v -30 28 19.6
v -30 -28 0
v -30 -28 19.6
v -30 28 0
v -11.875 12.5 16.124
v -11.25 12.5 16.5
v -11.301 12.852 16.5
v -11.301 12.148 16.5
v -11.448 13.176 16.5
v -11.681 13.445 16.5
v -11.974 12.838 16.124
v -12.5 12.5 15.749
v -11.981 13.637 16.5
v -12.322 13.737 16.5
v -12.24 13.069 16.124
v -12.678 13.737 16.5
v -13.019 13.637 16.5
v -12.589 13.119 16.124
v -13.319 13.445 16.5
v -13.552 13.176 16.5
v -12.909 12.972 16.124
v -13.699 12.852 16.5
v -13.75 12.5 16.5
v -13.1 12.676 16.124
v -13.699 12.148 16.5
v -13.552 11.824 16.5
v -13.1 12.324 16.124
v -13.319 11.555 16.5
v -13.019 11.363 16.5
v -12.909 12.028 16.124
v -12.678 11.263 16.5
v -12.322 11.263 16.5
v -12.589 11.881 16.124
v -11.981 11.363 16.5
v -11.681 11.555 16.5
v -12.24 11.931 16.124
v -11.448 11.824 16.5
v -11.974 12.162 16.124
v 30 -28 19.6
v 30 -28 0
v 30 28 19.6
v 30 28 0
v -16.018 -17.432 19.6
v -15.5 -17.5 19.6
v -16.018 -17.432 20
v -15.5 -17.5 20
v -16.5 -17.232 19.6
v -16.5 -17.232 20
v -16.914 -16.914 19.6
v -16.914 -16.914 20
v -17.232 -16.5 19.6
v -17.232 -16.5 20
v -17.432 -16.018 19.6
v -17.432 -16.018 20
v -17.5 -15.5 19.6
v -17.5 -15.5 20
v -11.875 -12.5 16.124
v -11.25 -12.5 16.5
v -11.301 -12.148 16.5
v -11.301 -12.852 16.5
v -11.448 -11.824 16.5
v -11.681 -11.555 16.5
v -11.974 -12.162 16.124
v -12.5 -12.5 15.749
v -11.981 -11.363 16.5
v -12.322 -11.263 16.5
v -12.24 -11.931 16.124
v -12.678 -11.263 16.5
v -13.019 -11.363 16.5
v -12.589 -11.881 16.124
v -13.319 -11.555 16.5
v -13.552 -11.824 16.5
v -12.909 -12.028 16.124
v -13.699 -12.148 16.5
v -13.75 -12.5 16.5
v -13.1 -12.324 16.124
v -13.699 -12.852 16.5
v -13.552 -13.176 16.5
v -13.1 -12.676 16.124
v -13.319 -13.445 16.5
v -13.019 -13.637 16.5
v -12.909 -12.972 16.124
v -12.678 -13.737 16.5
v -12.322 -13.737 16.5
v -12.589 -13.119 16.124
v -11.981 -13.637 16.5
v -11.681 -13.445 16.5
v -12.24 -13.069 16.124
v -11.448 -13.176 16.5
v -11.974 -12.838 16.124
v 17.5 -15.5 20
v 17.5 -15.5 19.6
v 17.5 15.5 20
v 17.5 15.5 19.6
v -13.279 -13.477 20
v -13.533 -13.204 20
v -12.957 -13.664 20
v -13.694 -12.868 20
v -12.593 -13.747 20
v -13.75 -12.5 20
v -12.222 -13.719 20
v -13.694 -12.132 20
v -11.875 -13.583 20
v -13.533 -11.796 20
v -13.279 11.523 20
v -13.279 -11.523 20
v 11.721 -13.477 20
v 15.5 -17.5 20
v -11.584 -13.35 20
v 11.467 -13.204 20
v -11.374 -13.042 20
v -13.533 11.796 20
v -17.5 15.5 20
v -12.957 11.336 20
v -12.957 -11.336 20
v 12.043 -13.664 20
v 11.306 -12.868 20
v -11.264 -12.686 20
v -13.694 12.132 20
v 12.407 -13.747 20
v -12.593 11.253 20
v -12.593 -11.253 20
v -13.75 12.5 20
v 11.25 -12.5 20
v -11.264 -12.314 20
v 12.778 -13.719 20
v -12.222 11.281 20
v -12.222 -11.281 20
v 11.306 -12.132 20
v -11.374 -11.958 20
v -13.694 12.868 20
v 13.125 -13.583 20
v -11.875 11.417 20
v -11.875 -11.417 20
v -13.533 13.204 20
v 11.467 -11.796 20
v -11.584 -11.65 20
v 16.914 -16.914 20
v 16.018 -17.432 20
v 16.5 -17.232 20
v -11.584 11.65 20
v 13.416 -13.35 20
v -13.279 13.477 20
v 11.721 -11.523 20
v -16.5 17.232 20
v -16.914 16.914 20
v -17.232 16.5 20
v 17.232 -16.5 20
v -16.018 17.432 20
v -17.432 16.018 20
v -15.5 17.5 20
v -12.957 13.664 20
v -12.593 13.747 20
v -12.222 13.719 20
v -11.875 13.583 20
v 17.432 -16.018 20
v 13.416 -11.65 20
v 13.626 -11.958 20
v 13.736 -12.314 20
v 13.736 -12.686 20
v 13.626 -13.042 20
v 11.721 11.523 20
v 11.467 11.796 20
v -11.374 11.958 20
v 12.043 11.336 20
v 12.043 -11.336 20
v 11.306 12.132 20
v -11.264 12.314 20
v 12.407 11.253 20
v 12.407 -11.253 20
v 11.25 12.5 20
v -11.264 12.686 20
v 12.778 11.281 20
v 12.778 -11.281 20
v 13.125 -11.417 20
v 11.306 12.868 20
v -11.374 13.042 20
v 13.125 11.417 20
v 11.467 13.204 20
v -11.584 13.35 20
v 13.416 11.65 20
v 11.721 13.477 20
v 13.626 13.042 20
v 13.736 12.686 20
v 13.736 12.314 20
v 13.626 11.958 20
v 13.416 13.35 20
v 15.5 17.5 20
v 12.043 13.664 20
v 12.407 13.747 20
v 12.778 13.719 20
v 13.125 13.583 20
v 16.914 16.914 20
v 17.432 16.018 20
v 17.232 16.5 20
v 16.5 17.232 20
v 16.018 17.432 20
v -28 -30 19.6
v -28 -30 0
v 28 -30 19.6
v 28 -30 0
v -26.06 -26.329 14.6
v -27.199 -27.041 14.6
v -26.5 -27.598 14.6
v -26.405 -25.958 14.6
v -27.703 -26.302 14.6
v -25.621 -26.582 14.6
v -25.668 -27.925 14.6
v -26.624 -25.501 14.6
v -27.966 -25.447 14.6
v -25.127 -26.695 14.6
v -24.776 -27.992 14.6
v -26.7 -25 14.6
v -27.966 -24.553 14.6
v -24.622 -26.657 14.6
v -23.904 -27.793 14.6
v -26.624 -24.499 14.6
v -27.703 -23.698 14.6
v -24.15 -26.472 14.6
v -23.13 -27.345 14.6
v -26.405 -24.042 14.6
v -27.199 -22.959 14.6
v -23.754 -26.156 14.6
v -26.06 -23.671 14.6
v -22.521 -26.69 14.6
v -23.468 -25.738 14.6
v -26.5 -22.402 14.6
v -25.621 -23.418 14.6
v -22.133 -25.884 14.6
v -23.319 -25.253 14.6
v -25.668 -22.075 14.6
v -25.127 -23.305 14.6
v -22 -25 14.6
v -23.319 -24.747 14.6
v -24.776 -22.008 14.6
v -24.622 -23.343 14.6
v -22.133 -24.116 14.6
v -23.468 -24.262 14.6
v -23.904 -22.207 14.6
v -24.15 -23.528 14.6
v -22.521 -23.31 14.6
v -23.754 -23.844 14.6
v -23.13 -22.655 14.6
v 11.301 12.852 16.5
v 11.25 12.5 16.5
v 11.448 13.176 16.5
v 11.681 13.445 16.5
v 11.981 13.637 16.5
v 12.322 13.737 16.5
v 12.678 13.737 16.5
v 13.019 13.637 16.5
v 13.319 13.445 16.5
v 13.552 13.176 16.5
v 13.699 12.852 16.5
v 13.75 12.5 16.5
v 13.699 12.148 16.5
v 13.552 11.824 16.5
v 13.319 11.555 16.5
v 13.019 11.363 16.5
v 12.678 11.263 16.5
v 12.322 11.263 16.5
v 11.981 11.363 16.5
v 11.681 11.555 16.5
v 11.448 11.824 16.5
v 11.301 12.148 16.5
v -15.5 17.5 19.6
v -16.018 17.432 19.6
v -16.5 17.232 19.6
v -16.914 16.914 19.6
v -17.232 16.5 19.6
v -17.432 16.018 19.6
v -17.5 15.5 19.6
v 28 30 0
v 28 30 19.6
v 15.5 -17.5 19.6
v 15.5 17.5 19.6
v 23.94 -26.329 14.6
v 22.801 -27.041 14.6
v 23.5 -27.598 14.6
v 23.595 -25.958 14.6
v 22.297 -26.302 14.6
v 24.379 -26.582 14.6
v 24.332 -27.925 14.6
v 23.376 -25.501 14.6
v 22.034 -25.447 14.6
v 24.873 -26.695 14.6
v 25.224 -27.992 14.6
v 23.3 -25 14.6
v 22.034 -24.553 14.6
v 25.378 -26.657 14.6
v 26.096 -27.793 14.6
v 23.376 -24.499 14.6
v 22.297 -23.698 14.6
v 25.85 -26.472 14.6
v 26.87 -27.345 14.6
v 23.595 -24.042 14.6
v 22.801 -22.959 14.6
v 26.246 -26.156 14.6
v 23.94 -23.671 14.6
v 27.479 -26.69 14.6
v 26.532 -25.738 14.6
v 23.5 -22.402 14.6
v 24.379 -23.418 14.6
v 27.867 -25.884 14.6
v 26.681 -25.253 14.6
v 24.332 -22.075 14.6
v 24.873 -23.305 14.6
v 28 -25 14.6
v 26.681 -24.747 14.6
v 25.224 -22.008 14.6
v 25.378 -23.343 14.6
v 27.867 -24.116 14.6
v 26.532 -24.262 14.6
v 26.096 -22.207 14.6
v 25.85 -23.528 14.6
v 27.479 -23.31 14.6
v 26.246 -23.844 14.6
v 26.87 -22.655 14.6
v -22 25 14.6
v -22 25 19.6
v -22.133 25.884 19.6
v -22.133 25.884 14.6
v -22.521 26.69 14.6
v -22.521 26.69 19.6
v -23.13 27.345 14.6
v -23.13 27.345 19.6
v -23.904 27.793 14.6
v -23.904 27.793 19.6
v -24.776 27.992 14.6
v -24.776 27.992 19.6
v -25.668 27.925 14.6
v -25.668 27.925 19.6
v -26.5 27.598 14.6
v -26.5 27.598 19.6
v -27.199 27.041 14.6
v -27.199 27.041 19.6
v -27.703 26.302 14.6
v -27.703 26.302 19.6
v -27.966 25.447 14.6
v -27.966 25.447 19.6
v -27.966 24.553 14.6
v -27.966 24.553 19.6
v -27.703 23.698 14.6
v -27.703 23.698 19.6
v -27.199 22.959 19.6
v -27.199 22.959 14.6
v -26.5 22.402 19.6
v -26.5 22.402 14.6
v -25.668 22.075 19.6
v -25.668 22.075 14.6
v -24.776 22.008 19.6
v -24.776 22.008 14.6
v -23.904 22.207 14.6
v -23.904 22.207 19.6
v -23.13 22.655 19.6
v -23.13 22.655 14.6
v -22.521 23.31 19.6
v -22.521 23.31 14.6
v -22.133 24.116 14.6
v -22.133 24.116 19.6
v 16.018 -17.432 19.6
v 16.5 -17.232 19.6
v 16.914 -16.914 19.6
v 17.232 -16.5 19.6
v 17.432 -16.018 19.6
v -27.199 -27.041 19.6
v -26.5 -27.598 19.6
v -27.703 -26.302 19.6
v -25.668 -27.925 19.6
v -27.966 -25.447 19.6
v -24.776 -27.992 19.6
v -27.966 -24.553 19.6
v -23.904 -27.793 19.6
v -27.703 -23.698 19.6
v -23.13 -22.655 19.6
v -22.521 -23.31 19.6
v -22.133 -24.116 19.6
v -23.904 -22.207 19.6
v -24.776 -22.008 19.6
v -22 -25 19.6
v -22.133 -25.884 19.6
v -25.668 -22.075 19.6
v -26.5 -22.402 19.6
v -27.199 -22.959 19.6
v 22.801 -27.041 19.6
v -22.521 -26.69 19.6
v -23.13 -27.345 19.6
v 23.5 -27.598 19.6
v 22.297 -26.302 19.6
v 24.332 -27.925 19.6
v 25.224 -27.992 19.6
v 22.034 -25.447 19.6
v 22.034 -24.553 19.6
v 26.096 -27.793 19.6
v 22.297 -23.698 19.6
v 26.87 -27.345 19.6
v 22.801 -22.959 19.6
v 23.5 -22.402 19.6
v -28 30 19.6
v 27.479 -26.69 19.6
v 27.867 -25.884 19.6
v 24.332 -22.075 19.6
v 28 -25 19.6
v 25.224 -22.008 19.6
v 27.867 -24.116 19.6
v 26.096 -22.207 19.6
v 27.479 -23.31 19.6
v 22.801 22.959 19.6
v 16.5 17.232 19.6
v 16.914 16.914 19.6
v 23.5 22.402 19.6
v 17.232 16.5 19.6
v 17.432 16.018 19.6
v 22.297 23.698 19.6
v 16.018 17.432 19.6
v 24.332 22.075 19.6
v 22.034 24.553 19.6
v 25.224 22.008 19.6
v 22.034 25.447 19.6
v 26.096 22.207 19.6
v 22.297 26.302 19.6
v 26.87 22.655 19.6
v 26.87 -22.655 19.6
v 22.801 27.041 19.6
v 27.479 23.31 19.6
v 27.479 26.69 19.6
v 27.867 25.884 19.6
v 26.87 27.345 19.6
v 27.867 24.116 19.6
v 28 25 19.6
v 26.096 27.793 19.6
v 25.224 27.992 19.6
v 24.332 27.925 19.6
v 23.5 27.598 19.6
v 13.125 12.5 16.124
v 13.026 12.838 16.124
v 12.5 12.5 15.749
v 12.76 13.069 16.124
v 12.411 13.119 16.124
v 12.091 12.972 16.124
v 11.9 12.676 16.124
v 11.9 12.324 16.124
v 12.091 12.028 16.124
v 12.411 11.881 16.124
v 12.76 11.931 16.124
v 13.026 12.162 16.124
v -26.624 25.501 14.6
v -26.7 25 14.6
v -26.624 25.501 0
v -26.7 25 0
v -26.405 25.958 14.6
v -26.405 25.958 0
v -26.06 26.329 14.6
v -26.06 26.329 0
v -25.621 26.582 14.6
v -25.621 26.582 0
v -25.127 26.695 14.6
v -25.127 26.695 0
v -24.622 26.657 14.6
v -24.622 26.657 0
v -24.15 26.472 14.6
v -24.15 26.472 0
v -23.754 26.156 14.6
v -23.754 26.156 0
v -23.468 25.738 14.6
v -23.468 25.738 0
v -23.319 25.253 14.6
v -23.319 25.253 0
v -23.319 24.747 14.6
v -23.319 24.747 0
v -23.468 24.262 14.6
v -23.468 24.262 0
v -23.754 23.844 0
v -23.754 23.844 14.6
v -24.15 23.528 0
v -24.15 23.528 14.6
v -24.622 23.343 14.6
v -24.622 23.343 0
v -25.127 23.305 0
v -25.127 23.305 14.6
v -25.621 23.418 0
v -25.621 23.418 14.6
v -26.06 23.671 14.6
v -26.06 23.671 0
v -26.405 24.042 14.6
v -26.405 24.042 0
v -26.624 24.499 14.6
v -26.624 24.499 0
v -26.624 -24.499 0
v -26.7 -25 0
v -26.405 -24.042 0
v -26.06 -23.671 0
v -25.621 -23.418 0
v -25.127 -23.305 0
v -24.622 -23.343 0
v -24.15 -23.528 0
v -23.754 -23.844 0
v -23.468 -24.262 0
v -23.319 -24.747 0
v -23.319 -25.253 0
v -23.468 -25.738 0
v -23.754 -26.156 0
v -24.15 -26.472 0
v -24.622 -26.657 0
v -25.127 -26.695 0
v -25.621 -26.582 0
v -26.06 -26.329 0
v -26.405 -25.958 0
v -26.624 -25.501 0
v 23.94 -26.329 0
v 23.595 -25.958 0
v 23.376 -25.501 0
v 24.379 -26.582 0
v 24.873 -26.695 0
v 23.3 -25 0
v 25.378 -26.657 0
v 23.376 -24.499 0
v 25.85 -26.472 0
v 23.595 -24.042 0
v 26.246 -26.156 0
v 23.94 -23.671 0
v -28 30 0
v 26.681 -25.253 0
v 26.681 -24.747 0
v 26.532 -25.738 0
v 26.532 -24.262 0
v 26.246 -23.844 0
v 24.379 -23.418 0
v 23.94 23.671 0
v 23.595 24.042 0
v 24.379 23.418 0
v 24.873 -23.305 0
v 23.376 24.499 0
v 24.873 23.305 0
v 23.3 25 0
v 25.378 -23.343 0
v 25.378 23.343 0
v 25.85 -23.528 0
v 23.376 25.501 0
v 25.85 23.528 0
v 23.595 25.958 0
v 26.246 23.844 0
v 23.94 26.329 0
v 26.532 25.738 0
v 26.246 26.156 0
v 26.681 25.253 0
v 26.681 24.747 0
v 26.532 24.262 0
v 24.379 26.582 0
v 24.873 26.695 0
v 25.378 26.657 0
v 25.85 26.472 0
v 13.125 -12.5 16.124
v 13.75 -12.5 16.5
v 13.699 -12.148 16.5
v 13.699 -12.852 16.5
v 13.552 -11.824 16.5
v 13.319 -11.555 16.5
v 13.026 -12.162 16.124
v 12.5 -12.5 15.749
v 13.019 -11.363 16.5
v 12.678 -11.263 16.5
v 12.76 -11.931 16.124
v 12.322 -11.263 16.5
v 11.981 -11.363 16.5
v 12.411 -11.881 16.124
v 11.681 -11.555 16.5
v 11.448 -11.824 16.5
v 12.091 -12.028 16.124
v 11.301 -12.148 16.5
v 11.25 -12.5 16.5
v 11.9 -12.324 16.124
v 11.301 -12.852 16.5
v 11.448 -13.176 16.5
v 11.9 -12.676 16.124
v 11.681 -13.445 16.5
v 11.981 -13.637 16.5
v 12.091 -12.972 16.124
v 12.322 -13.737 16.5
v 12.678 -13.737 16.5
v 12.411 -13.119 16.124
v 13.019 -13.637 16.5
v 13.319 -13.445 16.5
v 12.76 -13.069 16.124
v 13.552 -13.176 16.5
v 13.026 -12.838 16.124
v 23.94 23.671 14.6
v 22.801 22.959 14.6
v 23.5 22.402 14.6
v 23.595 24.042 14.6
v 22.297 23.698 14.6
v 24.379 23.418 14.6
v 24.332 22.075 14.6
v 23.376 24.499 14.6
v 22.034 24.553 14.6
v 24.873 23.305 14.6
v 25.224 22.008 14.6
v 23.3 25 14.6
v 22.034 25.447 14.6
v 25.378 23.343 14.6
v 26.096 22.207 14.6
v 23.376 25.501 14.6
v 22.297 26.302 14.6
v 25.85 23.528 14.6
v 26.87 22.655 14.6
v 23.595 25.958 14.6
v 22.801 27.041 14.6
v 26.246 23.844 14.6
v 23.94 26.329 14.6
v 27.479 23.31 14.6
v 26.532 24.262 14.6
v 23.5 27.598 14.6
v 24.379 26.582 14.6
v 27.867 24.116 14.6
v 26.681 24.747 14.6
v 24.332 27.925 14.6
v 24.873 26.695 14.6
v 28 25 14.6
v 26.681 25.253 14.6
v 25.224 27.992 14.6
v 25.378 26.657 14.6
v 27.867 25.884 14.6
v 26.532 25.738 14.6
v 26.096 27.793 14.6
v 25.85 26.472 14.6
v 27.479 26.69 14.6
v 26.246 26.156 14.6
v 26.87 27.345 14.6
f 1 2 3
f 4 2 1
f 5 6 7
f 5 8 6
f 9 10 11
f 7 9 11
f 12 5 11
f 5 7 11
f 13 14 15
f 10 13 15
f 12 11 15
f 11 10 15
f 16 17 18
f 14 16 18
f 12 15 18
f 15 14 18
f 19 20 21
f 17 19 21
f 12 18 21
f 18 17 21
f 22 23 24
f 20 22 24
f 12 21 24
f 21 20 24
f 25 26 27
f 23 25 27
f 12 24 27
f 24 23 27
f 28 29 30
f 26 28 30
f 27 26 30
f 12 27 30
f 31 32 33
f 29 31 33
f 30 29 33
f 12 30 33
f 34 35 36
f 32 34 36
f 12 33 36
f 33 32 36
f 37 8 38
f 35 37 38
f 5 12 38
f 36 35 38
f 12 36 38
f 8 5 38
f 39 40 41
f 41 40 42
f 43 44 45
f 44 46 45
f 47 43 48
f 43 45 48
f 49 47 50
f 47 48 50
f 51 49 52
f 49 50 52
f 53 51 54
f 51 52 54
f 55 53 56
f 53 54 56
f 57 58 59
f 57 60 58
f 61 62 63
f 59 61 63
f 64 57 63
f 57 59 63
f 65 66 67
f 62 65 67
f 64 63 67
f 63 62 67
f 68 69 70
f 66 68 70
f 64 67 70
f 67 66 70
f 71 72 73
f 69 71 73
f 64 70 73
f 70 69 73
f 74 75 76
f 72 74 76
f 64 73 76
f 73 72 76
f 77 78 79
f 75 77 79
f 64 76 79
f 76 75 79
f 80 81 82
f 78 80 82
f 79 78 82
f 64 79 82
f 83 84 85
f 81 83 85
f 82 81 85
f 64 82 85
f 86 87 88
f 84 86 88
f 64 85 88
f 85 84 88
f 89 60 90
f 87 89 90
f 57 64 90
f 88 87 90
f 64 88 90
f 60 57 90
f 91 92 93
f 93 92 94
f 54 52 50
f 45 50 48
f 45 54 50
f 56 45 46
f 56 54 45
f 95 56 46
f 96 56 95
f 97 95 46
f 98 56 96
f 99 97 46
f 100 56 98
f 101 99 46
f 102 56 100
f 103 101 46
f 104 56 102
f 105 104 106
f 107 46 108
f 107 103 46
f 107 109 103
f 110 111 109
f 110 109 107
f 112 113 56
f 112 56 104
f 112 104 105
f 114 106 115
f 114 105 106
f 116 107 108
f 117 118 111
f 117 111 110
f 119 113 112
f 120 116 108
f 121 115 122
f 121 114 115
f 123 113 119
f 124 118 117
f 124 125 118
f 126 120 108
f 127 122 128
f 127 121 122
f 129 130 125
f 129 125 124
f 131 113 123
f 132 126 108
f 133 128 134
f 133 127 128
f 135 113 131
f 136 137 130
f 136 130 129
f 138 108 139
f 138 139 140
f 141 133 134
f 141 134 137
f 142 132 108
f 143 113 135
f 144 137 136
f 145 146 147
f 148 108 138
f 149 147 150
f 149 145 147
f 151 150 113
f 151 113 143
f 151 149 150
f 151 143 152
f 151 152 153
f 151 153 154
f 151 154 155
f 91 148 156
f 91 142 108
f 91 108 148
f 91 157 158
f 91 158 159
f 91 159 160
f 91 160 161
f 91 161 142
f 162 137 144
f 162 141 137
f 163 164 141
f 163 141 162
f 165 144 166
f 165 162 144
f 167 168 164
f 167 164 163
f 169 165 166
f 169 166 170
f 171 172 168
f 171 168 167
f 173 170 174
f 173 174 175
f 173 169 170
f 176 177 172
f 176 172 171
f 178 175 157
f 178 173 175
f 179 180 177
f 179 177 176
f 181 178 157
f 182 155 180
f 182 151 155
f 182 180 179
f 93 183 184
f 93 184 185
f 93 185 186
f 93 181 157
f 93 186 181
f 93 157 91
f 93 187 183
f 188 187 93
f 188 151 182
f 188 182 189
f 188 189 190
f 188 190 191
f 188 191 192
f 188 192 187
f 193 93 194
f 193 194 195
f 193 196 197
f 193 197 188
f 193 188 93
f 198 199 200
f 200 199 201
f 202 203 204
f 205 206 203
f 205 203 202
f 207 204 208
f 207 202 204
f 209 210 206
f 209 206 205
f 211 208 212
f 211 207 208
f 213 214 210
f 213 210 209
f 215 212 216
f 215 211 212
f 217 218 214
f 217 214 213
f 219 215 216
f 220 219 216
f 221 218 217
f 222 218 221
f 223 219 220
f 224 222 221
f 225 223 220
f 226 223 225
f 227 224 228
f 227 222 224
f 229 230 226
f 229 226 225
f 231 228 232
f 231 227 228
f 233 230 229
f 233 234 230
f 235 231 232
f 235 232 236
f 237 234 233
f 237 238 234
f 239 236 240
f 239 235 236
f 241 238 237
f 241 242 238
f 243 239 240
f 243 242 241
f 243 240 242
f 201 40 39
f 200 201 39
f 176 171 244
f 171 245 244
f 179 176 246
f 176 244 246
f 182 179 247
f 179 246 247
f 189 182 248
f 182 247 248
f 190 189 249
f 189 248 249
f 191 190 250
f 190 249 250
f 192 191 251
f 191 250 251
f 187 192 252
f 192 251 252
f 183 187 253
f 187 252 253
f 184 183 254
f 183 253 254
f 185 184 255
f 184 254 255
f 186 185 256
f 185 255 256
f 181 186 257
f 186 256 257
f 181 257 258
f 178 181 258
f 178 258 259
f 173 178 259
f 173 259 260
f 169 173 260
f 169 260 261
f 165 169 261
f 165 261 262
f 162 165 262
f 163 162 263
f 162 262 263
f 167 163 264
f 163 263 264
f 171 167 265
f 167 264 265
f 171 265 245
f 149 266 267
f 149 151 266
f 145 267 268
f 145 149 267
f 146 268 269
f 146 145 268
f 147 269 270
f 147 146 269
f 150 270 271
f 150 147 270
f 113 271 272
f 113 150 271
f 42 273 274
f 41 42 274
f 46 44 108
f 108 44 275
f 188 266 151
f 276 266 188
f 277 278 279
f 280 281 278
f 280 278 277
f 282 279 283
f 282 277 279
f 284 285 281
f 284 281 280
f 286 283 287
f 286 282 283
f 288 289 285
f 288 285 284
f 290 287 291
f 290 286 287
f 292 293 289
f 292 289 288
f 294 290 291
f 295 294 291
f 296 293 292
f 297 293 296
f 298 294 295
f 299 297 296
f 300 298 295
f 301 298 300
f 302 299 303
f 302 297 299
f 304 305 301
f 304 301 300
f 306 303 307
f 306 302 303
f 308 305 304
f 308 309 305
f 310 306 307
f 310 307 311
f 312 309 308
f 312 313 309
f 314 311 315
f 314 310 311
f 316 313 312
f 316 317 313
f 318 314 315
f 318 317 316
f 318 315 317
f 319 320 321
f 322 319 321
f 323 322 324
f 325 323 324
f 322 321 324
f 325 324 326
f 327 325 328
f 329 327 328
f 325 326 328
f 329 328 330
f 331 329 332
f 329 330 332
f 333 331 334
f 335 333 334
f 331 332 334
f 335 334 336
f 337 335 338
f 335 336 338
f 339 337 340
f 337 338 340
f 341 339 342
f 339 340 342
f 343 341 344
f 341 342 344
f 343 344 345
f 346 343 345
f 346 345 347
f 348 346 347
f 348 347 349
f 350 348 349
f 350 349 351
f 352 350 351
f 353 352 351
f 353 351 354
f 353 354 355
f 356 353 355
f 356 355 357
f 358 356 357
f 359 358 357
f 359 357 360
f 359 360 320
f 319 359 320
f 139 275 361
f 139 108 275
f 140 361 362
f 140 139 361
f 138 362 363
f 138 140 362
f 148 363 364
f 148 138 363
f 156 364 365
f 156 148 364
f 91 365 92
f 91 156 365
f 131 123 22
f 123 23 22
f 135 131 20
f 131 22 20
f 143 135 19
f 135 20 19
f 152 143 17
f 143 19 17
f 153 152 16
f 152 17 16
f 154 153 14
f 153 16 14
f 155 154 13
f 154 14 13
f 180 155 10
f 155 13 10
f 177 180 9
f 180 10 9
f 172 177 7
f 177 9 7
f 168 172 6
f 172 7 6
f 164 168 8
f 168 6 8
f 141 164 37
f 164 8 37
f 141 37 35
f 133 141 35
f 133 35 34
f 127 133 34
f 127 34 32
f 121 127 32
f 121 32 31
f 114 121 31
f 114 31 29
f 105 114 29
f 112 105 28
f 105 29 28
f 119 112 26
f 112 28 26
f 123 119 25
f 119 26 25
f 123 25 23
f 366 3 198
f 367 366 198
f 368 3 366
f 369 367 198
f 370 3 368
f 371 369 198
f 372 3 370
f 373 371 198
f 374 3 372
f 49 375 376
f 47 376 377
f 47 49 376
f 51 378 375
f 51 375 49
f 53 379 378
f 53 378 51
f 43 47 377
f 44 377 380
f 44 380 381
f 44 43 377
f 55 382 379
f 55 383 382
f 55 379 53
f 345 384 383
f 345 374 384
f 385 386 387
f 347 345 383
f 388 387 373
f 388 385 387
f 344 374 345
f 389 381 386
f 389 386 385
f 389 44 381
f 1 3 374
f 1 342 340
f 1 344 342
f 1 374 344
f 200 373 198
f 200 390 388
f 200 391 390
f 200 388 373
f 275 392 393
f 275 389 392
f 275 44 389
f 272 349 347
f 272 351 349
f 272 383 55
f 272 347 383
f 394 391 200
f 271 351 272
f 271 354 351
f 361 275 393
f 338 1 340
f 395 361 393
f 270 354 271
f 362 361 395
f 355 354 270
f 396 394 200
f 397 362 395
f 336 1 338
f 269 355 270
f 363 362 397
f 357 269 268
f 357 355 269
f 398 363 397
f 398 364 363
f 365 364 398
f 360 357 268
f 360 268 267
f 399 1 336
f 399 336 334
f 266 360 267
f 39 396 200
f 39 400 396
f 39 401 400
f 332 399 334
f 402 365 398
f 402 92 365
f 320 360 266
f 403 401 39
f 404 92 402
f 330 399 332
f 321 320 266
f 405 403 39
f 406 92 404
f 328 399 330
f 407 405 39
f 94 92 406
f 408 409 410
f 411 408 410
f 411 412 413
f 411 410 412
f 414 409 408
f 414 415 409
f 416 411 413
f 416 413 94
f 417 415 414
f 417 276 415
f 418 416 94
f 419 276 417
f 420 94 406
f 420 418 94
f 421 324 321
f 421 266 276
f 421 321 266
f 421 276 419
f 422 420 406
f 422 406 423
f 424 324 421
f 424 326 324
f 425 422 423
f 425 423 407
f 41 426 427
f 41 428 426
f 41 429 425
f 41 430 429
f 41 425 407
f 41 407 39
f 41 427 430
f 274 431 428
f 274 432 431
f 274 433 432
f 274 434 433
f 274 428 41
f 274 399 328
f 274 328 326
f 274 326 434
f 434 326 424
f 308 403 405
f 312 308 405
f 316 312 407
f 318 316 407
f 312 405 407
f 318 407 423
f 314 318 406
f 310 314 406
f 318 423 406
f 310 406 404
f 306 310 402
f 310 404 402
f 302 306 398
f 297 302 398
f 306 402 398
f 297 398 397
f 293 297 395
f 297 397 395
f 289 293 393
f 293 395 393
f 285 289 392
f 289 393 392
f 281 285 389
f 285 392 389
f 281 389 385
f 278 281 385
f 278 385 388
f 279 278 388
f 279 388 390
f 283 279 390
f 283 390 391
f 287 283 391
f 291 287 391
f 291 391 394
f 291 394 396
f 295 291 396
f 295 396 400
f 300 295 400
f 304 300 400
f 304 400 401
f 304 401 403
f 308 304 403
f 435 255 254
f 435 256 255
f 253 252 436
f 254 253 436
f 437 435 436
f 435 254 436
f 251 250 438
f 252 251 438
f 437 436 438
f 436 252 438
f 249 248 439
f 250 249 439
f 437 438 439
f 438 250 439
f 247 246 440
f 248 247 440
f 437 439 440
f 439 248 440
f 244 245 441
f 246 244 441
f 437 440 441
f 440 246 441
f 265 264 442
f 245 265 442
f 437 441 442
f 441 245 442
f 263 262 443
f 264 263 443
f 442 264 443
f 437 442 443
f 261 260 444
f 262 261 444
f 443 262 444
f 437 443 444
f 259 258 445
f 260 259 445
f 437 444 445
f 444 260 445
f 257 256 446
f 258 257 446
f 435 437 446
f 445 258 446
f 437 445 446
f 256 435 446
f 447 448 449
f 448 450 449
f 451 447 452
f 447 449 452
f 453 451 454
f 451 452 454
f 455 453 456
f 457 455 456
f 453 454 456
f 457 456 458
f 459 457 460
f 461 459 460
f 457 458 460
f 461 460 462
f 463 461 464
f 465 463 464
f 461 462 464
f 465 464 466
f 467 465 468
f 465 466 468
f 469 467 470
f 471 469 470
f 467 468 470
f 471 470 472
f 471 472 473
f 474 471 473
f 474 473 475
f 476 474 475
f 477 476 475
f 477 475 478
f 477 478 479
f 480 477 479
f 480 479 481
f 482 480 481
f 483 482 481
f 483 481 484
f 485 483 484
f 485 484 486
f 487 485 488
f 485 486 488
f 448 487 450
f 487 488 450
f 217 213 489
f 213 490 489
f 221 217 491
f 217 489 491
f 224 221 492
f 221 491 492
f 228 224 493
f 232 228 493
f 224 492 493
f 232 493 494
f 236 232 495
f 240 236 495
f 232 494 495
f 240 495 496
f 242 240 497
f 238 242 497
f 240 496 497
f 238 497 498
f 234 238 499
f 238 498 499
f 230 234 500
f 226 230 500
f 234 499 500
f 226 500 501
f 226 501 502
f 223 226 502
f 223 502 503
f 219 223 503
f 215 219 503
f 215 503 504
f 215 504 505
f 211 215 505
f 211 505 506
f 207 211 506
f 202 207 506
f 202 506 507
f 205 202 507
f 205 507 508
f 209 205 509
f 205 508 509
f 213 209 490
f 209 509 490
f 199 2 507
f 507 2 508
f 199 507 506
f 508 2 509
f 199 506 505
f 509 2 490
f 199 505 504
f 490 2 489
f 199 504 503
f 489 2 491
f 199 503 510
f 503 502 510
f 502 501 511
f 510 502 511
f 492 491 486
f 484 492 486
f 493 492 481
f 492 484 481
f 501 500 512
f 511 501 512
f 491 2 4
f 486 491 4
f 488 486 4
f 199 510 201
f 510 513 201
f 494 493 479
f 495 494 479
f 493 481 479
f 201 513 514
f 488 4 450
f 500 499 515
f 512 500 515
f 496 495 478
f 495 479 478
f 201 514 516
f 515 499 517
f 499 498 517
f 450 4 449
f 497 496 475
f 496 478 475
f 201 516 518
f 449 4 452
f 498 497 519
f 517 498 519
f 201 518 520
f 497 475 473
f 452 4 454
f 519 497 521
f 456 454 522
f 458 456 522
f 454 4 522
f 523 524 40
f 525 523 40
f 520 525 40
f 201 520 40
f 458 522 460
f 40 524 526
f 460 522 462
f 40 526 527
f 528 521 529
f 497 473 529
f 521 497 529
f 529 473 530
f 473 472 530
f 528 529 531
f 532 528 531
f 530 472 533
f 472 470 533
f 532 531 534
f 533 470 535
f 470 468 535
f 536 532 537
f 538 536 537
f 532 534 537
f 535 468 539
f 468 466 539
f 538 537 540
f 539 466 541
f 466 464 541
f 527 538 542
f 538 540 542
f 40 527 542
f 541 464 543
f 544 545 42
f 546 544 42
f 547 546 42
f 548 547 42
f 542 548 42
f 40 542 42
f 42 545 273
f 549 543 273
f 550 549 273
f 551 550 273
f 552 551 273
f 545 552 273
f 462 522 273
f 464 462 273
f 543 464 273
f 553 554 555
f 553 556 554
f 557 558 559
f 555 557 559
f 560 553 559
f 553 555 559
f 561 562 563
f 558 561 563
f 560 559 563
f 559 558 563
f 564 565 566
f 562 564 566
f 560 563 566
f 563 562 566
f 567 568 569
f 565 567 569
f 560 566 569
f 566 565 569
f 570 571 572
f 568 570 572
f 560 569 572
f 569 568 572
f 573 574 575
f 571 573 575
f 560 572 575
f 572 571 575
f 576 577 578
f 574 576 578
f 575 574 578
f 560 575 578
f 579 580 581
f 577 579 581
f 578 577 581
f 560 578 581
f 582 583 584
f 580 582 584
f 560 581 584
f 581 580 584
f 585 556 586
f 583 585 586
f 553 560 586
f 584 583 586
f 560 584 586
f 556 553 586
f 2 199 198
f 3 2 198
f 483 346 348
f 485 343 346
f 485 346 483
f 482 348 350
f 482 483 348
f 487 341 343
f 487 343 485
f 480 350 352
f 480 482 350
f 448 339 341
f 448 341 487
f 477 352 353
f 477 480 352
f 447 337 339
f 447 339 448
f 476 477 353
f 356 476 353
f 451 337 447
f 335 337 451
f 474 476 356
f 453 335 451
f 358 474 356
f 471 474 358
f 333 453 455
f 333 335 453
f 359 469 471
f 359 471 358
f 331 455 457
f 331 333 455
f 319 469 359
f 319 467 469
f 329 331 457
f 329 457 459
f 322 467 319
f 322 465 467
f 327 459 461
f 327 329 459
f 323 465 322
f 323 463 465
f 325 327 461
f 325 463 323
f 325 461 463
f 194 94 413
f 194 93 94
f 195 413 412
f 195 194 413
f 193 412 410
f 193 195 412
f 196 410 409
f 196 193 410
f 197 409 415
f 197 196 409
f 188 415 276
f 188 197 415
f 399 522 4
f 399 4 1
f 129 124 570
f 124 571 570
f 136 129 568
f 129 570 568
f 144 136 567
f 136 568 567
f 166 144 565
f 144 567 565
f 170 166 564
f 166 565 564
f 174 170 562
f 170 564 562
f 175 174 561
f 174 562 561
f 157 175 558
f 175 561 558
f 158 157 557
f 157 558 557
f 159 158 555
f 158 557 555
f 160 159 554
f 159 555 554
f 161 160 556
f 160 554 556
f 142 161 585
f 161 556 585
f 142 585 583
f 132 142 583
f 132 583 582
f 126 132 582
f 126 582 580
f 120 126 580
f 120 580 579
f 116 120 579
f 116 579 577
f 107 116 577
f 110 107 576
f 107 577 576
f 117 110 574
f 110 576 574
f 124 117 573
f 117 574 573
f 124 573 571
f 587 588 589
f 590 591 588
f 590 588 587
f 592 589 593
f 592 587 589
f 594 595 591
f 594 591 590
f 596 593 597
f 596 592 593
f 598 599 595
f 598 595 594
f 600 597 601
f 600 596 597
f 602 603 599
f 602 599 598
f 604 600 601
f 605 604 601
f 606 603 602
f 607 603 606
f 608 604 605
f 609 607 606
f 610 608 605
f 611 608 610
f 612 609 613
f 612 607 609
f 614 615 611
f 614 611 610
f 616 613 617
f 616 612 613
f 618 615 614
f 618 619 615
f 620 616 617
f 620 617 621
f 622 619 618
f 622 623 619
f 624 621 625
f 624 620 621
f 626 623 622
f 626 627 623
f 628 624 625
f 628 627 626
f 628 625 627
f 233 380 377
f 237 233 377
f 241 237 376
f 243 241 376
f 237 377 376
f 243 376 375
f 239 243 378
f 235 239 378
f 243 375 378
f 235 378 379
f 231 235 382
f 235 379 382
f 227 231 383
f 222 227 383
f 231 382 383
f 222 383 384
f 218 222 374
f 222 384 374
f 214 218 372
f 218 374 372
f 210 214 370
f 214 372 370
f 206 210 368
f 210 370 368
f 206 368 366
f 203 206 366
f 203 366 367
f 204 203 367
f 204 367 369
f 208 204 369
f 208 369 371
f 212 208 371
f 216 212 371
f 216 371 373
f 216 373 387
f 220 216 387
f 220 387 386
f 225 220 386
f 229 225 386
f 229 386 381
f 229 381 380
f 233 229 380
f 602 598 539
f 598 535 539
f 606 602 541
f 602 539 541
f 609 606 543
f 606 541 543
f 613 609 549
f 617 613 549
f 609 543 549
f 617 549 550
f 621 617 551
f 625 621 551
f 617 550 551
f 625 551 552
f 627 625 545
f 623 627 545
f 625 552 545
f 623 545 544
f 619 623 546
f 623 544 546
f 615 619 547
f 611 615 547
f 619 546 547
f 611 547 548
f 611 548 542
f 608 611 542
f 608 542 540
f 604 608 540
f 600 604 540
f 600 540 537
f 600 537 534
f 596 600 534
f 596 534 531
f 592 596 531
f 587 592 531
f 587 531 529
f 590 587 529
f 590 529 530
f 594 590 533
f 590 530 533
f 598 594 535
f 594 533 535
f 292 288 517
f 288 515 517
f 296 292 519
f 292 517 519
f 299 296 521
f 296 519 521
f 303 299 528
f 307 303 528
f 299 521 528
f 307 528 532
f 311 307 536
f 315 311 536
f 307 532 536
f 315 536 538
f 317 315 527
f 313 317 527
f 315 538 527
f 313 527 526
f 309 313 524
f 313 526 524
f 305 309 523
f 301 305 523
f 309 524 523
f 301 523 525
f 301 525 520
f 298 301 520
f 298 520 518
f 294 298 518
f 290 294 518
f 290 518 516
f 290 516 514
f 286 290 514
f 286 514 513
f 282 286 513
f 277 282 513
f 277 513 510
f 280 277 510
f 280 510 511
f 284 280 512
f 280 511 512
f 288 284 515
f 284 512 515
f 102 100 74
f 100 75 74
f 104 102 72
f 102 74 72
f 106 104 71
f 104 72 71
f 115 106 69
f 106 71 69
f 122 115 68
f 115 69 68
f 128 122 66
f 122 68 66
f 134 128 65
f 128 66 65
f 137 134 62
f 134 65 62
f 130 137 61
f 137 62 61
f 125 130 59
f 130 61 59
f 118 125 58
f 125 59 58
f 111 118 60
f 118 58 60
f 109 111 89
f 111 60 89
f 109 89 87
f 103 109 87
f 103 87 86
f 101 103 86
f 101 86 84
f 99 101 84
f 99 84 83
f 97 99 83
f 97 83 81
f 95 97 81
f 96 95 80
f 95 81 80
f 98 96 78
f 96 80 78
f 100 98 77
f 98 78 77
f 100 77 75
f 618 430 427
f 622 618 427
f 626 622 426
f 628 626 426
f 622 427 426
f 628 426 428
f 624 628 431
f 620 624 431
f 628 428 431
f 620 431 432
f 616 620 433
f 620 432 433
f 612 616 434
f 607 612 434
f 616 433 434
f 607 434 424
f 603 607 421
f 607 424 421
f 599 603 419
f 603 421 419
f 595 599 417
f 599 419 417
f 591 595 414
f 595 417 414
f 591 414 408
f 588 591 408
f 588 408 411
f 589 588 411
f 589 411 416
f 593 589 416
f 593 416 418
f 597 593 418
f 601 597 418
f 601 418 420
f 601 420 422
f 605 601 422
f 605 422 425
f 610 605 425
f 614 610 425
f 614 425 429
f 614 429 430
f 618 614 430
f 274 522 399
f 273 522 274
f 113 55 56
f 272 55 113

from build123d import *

# Parameters (mm, degrees)
SKETCH_1_W                = 60
SKETCH_1_H                = 60
EXTRUDE_1_DEPTH           = 19.6
CHAMFER_1_SIZE            = 2
SKETCH_2_W                = 35
SKETCH_2_H                = 35
EXTRUDE_2_DEPTH           = 0.4
FILLET_1_R                = 2
HOLE_WIZARD_1_D           = 3.4
HOLE_WIZARD_1_CBORE_D     = 6
HOLE_WIZARD_1_CBORE_DEPTH = 5
HOLE_WIZARD_M3_1_D        = 2.5
HOLE_WIZARD_M3_1_DEPTH    = 3.5
HOLE_WIZARD_M3_1_TIP      = 0.751075774


with BuildPart() as part:
    # 草图1 → 凸台-拉伸1 (new body)
    with BuildSketch(Plane.XY):
        Rectangle(SKETCH_1_W, SKETCH_1_H)
    extrude(amount=EXTRUDE_1_DEPTH)

    # 倒角1
    chamfer_1_edges = [part.edges().sort_by_distance(p)[0] for p in [
        (30, -30, 9.8),
        (-30, -30, 9.8),
        (-30, 30, 9.8),
        (30, 30, 9.8),
    ]]
    chamfer(chamfer_1_edges, length=CHAMFER_1_SIZE)

    # 草图2 → 凸台-拉伸2 (add)
    with BuildSketch(Plane.XY.offset(19.6)):
        Rectangle(SKETCH_2_W, SKETCH_2_H)
    extrude(amount=EXTRUDE_2_DEPTH)

    # 圆角1
    fillet_1_edges = [part.edges().sort_by_distance(p)[0] for p in [
        (17.5, -17.5, 19.8),
        (17.5, 17.5, 19.8),
        (-17.5, 17.5, 19.8),
        (-17.5, -17.5, 19.8),
    ]]
    fillet(fillet_1_edges, radius=FILLET_1_R)

    # 孔1 (through all)
    with Locations(Plane(origin=(-25, 25, 19.6), x_dir=(1, 0, 0), z_dir=(0, 0, 1))):
        with Locations((0, 0), (50, 0), (0, -50), (50, -50)):
            CounterBoreHole(HOLE_WIZARD_1_D / 2, HOLE_WIZARD_1_CBORE_D / 2, HOLE_WIZARD_1_CBORE_DEPTH)

    # M3 螺纹孔1
    with Locations(Plane(origin=(-12.5, 12.5, 20), x_dir=(1, 0, 0), z_dir=(0, 0, 1))):
        with Locations((0, 0), (25, 0), (25, -25), (0, -25)):
            Hole(HOLE_WIZARD_M3_1_D / 2, depth=HOLE_WIZARD_M3_1_DEPTH)
            with Locations((0, 0, -(HOLE_WIZARD_M3_1_DEPTH + HOLE_WIZARD_M3_1_TIP / 2))):  # 118° drill point
                Cone(0, HOLE_WIZARD_M3_1_D / 2, HOLE_WIZARD_M3_1_TIP, mode=Mode.SUBTRACT)


solid = part.part
